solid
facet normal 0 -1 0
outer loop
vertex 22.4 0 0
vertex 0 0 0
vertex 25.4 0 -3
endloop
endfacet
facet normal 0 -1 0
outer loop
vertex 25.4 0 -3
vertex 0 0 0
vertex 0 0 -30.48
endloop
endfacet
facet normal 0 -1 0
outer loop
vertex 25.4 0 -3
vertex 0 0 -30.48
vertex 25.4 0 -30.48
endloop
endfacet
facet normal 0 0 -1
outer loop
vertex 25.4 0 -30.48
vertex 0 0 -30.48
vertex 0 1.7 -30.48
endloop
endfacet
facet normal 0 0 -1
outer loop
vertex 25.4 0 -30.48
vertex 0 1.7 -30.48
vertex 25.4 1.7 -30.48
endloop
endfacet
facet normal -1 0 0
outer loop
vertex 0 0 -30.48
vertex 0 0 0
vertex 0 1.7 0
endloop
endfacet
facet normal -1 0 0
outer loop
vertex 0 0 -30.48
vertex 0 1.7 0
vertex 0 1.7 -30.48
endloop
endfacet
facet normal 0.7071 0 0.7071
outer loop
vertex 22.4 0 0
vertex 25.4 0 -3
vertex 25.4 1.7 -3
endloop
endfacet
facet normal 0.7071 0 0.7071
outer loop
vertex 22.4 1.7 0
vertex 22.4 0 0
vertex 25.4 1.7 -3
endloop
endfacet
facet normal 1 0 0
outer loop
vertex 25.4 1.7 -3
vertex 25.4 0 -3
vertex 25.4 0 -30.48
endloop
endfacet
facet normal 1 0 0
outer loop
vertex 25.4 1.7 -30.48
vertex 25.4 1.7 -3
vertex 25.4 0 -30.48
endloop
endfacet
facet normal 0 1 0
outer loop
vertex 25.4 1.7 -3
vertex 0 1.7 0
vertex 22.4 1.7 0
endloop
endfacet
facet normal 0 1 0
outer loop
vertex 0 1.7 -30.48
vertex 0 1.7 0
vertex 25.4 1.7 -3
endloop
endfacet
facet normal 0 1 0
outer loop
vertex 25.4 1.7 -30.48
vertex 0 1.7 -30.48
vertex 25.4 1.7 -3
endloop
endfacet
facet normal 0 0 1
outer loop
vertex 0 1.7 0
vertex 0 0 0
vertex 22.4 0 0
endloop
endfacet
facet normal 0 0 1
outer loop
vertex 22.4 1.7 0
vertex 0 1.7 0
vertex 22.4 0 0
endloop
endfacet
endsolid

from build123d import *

# Parameters (mm, degrees)
SKETCH1_W           = 25.4
SKETCH1_H           = 30.48
BOSS_EXTRUDE1_DEPTH = 1.7
CHAMFER1_SIZE       = 3


with BuildPart() as part:
    # Sketch1 → Boss-Extrude1 (new body)
    with BuildSketch(Plane(origin=(0, 0, 0), x_dir=(1, 0, 0), z_dir=(0, 1, 0))):
        with Locations((12.7, 15.24)):
            Rectangle(SKETCH1_W, SKETCH1_H)
    extrude(amount=BOSS_EXTRUDE1_DEPTH)

    # Chamfer1
    chamfer1_edges = [part.edges().sort_by_distance(p)[0] for p in [
        (25.4, 0.85, 0),
    ]]
    chamfer(chamfer1_edges, length=CHAMFER1_SIZE)


solid = part.part
